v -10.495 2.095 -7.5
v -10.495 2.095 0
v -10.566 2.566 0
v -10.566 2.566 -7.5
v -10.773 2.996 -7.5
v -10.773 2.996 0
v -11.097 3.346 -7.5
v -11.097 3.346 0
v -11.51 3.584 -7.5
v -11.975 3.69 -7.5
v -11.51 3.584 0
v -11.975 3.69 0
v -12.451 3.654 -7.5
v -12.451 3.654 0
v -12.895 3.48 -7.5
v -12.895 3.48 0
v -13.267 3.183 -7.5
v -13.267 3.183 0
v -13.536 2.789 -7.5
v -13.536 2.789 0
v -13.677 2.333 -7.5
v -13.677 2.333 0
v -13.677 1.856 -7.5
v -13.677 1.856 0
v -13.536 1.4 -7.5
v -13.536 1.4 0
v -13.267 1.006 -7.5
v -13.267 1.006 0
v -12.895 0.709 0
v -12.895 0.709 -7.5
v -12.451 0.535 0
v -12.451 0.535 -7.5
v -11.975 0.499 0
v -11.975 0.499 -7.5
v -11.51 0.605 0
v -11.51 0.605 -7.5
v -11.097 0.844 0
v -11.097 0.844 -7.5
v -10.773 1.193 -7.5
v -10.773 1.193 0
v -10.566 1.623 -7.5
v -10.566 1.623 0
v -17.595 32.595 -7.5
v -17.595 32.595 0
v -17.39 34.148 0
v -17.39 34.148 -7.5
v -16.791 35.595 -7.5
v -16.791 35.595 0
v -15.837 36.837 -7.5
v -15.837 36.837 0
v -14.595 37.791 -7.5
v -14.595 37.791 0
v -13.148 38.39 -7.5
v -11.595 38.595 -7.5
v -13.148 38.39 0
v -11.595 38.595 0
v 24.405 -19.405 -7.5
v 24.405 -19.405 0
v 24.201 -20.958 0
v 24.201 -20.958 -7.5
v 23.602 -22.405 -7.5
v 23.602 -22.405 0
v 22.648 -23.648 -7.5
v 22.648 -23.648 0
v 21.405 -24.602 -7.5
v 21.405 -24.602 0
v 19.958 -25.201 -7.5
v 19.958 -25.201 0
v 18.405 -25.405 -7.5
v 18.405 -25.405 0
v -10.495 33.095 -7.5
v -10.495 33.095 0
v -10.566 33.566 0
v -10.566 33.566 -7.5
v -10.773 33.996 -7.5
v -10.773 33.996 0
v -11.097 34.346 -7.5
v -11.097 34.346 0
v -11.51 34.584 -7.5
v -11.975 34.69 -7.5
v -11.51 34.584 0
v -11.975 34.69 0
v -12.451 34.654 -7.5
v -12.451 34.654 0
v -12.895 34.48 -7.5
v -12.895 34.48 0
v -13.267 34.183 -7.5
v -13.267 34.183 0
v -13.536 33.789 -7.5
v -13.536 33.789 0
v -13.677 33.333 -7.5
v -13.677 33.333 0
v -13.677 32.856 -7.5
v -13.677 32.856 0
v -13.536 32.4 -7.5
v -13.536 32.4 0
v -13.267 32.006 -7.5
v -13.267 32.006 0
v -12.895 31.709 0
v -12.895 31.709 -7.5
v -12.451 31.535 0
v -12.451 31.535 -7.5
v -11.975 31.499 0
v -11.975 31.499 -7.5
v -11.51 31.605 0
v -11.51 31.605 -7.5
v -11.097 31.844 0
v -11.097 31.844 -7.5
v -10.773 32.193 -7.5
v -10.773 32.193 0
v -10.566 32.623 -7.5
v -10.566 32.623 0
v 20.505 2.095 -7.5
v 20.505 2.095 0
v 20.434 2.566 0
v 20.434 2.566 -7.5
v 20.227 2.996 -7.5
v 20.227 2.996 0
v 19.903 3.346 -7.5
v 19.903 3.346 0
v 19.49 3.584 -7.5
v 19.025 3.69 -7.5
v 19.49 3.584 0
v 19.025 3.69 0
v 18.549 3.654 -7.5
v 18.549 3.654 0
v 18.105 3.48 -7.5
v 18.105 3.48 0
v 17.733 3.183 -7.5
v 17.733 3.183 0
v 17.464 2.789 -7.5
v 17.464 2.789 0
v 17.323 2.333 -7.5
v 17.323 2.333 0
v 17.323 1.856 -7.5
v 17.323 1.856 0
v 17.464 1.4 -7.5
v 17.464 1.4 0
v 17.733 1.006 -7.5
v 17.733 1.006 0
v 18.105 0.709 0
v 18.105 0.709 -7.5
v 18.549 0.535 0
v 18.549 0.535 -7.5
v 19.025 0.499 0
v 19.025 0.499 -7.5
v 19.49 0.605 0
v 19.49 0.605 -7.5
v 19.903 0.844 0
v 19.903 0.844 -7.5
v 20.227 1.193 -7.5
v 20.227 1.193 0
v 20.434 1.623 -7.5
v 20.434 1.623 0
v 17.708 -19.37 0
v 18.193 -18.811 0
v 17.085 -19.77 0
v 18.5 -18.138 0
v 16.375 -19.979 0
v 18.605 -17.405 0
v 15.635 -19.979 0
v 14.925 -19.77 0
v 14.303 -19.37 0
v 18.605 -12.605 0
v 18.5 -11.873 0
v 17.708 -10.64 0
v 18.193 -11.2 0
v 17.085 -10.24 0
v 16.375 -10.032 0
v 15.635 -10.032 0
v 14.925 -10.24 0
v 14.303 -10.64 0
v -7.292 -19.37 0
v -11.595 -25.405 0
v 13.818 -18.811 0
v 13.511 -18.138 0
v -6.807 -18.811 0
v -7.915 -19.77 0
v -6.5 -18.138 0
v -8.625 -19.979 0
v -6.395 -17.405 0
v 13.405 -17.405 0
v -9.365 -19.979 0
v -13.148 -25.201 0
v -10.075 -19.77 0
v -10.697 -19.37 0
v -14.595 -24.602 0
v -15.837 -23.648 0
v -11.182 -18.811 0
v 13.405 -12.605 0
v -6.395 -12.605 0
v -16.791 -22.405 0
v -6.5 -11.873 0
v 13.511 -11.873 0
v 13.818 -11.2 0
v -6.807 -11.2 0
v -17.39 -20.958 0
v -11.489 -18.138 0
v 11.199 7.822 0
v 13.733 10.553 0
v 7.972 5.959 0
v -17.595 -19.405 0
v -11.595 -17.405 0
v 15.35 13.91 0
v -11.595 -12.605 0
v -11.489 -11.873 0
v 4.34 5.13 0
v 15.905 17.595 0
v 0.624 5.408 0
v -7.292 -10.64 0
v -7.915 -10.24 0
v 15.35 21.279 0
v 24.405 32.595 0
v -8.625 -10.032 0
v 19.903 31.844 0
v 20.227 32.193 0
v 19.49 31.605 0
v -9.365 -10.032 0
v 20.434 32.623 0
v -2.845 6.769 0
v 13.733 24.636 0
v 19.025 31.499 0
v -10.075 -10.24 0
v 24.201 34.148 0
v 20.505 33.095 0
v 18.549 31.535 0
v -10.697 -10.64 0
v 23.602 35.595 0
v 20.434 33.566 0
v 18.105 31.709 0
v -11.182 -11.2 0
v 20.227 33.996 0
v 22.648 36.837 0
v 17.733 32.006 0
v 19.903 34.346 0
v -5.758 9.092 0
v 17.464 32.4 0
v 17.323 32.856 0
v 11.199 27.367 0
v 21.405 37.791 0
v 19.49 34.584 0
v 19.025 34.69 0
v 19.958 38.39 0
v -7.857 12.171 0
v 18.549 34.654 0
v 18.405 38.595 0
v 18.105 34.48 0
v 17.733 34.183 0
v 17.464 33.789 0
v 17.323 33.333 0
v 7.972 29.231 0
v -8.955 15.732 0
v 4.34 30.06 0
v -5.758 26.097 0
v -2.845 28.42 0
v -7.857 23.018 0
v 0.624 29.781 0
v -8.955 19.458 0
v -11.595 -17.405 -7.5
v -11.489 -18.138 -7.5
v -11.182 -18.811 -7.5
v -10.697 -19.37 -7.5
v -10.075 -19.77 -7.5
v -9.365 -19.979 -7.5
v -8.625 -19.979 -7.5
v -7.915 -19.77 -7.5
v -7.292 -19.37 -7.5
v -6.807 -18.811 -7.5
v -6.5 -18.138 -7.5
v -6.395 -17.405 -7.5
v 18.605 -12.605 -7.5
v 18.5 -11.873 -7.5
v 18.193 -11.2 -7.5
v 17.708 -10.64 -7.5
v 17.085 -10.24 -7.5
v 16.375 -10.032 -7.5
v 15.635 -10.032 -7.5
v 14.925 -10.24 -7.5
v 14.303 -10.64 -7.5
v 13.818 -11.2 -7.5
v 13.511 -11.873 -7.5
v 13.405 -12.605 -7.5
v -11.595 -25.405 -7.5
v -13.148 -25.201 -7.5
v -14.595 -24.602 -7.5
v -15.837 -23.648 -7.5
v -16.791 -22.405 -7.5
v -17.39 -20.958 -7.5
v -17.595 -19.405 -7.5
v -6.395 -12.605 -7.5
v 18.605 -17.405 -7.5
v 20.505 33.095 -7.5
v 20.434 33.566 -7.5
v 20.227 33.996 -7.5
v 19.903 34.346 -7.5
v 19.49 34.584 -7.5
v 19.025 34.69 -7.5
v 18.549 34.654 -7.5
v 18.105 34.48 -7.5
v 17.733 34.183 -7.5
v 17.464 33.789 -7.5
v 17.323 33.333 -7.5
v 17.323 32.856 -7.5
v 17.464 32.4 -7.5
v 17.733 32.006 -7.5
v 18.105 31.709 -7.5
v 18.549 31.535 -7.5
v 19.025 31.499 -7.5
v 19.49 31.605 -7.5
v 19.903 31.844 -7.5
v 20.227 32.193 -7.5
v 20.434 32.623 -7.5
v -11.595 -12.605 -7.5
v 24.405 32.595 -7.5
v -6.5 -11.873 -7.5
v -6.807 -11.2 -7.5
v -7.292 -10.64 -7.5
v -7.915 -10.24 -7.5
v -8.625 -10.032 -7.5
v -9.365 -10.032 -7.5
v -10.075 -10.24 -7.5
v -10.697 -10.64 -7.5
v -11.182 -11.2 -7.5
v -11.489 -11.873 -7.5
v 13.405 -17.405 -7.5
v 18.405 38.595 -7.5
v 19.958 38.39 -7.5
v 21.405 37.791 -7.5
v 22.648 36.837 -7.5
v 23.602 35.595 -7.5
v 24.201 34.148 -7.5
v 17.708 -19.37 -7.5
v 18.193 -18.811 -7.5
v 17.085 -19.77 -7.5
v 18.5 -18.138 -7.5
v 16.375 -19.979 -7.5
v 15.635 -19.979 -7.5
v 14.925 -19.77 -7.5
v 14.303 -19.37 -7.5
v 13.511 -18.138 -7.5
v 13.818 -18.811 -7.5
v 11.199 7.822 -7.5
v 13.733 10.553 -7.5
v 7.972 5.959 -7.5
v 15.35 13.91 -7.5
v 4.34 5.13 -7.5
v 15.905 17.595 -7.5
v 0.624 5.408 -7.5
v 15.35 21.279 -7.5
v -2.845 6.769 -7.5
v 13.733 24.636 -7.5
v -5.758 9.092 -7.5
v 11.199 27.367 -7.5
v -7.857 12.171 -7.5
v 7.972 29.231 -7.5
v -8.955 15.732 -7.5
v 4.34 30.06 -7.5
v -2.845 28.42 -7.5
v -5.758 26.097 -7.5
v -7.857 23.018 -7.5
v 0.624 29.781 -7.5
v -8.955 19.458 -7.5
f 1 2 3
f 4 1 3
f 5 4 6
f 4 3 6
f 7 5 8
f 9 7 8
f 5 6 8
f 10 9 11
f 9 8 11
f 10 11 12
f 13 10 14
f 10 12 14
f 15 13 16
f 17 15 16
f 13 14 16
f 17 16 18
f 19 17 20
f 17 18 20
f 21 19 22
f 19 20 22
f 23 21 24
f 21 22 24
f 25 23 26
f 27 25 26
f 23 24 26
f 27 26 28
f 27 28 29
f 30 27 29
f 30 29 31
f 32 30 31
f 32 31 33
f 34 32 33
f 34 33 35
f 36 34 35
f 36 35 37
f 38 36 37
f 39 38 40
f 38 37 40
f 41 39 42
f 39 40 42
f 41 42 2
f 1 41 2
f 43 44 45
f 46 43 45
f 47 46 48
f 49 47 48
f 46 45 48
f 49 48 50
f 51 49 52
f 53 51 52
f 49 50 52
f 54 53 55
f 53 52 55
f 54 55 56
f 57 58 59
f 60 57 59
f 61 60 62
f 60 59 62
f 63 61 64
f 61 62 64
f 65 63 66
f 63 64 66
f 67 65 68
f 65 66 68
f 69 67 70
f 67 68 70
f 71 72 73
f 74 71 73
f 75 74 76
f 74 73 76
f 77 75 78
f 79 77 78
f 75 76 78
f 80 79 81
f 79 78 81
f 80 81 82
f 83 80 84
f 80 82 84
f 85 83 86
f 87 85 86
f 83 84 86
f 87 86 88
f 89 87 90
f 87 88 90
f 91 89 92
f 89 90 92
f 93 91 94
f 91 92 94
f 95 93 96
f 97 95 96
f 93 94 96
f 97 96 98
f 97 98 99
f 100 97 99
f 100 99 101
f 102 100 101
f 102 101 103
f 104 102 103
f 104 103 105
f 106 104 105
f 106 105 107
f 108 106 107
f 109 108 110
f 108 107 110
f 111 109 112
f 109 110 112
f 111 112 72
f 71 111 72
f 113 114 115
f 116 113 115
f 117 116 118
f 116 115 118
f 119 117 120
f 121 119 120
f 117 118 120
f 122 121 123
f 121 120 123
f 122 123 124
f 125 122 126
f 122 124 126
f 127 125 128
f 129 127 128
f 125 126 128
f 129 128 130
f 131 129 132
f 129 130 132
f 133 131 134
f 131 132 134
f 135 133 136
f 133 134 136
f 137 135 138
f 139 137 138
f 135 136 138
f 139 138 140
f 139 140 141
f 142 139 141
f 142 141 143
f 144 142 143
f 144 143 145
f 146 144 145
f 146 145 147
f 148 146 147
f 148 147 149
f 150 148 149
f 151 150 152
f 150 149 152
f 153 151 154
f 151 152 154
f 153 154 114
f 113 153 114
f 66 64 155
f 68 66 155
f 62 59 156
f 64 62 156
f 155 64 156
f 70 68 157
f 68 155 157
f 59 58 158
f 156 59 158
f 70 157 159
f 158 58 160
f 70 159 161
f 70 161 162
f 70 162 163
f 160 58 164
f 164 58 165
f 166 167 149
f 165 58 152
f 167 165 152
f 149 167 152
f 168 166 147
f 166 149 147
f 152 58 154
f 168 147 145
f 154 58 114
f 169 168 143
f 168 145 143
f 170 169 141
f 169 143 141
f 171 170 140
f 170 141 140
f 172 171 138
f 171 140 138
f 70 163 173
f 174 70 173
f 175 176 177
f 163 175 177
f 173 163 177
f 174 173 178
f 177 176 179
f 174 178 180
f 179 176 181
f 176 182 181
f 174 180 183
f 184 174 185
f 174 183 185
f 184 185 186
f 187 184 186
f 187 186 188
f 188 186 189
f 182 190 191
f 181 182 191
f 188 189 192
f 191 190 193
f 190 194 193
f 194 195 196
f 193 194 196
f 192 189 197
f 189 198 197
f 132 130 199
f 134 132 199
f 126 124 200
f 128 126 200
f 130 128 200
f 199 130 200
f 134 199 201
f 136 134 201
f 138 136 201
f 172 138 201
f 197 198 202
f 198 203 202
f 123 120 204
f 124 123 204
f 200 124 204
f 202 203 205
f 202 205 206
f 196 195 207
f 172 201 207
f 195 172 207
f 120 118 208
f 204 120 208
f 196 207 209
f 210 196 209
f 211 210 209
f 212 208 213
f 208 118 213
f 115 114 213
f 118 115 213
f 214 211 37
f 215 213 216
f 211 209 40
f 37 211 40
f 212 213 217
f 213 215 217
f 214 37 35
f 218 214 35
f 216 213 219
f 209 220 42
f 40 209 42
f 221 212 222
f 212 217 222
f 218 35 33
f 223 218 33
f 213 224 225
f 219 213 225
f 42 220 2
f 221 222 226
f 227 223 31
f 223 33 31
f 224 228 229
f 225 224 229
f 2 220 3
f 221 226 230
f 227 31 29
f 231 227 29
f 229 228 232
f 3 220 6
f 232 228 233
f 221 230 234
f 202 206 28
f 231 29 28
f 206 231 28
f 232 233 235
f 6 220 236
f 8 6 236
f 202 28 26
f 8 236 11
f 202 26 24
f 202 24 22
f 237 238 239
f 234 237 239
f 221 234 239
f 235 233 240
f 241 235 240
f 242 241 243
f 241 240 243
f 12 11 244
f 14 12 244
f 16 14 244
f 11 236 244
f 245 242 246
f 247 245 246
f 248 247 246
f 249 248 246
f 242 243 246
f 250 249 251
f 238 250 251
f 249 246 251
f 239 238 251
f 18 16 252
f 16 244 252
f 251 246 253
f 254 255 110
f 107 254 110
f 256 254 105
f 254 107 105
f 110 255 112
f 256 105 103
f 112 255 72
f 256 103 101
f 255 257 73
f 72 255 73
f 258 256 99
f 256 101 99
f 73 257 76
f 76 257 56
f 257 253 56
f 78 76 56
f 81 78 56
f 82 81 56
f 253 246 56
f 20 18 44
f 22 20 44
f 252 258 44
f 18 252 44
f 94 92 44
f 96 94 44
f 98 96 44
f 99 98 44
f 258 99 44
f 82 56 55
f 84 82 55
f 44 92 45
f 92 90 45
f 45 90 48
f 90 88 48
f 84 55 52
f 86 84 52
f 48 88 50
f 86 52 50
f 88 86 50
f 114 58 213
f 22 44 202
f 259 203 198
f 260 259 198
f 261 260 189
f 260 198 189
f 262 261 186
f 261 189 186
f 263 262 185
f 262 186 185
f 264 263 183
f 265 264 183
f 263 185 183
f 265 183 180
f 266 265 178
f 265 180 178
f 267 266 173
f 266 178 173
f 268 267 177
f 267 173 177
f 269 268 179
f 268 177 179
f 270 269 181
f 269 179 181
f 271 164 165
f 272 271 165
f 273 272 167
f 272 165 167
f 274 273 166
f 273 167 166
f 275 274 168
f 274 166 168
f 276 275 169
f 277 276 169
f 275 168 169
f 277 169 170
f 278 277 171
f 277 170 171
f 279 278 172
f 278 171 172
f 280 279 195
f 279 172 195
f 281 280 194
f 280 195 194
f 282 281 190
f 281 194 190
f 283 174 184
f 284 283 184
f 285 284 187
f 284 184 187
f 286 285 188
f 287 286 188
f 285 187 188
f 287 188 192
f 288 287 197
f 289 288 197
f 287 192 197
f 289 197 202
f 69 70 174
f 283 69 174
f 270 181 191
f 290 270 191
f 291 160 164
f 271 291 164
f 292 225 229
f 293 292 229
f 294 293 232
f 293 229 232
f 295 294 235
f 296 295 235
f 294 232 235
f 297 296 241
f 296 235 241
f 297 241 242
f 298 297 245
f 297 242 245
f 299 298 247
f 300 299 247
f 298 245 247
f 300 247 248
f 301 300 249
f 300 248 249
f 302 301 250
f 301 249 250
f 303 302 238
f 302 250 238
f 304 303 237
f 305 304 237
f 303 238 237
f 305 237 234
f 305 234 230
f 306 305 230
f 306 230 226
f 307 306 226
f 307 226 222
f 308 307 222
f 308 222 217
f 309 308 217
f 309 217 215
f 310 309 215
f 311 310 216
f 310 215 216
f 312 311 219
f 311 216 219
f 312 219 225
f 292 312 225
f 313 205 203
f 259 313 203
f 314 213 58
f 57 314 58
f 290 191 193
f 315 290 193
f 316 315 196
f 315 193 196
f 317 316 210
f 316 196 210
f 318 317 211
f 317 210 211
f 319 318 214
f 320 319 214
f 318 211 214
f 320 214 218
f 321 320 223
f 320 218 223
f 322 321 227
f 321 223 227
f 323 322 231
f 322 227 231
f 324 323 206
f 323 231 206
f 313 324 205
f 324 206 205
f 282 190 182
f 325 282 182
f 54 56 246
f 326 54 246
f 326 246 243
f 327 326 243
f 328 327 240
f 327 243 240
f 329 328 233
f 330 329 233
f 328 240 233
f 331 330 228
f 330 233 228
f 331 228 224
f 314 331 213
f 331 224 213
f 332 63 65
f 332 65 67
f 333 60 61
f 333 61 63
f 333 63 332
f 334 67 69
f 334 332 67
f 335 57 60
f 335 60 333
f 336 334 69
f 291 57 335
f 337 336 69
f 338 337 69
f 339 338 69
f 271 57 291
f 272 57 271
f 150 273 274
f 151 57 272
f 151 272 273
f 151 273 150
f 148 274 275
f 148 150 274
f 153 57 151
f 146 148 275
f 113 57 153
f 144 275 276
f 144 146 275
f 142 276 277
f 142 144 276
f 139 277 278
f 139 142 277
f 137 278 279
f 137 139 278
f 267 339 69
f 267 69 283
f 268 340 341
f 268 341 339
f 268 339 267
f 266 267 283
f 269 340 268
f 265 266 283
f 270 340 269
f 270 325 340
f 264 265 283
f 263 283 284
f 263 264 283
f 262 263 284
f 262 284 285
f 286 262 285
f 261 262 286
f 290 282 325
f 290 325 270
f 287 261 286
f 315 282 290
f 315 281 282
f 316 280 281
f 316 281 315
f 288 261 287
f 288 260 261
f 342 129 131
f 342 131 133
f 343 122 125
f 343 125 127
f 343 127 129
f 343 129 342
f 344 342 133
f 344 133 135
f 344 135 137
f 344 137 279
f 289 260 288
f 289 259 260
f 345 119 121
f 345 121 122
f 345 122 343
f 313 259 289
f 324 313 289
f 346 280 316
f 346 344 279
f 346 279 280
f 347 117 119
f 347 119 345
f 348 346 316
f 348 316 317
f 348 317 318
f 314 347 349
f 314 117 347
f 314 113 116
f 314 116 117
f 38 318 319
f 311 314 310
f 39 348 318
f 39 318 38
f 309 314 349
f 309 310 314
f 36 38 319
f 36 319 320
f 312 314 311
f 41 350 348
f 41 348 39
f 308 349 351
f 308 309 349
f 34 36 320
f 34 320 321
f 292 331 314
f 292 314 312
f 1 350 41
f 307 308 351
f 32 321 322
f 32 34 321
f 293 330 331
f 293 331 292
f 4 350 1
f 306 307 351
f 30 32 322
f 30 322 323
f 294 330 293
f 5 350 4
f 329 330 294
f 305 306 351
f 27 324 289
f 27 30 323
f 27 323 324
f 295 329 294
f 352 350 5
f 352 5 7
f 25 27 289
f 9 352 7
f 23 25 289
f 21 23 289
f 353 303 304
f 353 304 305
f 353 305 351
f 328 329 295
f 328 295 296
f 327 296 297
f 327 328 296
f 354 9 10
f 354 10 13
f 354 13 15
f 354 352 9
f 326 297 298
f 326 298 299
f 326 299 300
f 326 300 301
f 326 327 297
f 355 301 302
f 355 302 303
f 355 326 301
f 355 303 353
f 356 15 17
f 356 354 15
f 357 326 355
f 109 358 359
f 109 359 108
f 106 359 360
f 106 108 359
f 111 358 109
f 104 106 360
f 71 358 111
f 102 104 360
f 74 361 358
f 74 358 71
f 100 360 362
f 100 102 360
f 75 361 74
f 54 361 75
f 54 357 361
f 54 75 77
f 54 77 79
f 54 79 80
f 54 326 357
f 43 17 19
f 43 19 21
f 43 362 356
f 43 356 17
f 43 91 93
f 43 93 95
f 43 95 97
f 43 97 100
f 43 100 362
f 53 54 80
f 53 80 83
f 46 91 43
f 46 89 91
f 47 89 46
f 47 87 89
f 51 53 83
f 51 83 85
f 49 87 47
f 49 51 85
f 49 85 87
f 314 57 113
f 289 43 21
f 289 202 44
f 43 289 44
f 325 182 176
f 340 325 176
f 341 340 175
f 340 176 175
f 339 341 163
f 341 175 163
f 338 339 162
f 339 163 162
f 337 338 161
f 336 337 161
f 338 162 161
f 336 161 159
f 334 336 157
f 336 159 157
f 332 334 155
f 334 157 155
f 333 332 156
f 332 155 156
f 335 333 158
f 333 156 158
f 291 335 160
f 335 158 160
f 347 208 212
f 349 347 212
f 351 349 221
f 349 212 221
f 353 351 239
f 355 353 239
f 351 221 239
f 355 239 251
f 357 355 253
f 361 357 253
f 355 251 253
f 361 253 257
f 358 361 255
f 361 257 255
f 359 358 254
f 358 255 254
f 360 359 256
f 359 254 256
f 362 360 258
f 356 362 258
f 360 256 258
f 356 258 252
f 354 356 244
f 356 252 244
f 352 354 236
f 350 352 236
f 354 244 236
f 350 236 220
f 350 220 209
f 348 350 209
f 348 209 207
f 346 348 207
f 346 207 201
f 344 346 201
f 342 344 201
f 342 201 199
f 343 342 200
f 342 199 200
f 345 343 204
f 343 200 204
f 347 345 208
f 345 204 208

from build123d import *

# Parameters (mm, degrees)
SKETCH_1_R      = 12.5
SKETCH_1_R_2    = 1.6
EXTRUDE_1_DEPTH = 7.5


with BuildPart() as part:
    # 草图1 → 凸台-拉伸1 (new body)
    with BuildSketch(Plane.XY):
        with BuildLine():
            Line((-11.594594595, 38.594594595), (18.405405405, 38.594594595))
            ThreePointArc((18.405405405, 38.594594595), (22.648046093, 36.837235282), (24.405405405, 32.594594595))
            Line((24.405405405, 32.594594595), (24.405405405, -19.405405405))
            ThreePointArc((24.405405405, -19.405405405), (22.648046093, -23.648046093), (18.405405405, -25.405405405))
            Line((18.405405405, -25.405405405), (-11.594594595, -25.405405405))
            ThreePointArc((-11.594594595, -25.405405405), (-15.837235282, -23.648046093), (-17.594594595, -19.405405405))
            Line((-17.594594595, -19.405405405), (-17.594594595, 32.594594595))
            ThreePointArc((-17.594594595, 32.594594595), (-15.837235282, 36.837235282), (-11.594594595, 38.594594595))
        make_face()
        with Locations((3.405405405, 17.594594595)):
            Circle(SKETCH_1_R, mode=Mode.SUBTRACT)
        with Locations((-12.094594595, 33.094594595)):
            Circle(SKETCH_1_R_2, mode=Mode.SUBTRACT)
        with Locations((18.905405405, 33.094594595)):
            Circle(SKETCH_1_R_2, mode=Mode.SUBTRACT)
        with Locations((18.905405405, 2.094594595)):
            Circle(SKETCH_1_R_2, mode=Mode.SUBTRACT)
        with Locations((-12.094594595, 2.094594595)):
            Circle(SKETCH_1_R_2, mode=Mode.SUBTRACT)
        with BuildLine():
            Line((13.405405405, -12.605405405), (13.405405405, -17.40540541))
            ThreePointArc((13.405405405, -17.40540541), (16.005405405, -20.00540541), (18.605405405, -17.40540541))
            Line((18.605405405, -17.40540541), (18.605405405, -12.605405405))
            ThreePointArc((18.605405405, -12.605405405), (16.005405405, -10.005405405), (13.405405405, -12.605405405))
        make_face(mode=Mode.SUBTRACT)
        with BuildLine():
            Line((-11.594594595, -12.605405405), (-11.594594595, -17.40540541))
            ThreePointArc((-11.594594595, -17.40540541), (-8.994594595, -20.00540541), (-6.394594595, -17.40540541))
            Line((-6.394594595, -17.40540541), (-6.394594595, -12.605405405))
            ThreePointArc((-6.394594595, -12.605405405), (-8.994594595, -10.005405405), (-11.594594595, -12.605405405))
        make_face(mode=Mode.SUBTRACT)
    extrude(amount=-EXTRUDE_1_DEPTH)


solid = part.part
